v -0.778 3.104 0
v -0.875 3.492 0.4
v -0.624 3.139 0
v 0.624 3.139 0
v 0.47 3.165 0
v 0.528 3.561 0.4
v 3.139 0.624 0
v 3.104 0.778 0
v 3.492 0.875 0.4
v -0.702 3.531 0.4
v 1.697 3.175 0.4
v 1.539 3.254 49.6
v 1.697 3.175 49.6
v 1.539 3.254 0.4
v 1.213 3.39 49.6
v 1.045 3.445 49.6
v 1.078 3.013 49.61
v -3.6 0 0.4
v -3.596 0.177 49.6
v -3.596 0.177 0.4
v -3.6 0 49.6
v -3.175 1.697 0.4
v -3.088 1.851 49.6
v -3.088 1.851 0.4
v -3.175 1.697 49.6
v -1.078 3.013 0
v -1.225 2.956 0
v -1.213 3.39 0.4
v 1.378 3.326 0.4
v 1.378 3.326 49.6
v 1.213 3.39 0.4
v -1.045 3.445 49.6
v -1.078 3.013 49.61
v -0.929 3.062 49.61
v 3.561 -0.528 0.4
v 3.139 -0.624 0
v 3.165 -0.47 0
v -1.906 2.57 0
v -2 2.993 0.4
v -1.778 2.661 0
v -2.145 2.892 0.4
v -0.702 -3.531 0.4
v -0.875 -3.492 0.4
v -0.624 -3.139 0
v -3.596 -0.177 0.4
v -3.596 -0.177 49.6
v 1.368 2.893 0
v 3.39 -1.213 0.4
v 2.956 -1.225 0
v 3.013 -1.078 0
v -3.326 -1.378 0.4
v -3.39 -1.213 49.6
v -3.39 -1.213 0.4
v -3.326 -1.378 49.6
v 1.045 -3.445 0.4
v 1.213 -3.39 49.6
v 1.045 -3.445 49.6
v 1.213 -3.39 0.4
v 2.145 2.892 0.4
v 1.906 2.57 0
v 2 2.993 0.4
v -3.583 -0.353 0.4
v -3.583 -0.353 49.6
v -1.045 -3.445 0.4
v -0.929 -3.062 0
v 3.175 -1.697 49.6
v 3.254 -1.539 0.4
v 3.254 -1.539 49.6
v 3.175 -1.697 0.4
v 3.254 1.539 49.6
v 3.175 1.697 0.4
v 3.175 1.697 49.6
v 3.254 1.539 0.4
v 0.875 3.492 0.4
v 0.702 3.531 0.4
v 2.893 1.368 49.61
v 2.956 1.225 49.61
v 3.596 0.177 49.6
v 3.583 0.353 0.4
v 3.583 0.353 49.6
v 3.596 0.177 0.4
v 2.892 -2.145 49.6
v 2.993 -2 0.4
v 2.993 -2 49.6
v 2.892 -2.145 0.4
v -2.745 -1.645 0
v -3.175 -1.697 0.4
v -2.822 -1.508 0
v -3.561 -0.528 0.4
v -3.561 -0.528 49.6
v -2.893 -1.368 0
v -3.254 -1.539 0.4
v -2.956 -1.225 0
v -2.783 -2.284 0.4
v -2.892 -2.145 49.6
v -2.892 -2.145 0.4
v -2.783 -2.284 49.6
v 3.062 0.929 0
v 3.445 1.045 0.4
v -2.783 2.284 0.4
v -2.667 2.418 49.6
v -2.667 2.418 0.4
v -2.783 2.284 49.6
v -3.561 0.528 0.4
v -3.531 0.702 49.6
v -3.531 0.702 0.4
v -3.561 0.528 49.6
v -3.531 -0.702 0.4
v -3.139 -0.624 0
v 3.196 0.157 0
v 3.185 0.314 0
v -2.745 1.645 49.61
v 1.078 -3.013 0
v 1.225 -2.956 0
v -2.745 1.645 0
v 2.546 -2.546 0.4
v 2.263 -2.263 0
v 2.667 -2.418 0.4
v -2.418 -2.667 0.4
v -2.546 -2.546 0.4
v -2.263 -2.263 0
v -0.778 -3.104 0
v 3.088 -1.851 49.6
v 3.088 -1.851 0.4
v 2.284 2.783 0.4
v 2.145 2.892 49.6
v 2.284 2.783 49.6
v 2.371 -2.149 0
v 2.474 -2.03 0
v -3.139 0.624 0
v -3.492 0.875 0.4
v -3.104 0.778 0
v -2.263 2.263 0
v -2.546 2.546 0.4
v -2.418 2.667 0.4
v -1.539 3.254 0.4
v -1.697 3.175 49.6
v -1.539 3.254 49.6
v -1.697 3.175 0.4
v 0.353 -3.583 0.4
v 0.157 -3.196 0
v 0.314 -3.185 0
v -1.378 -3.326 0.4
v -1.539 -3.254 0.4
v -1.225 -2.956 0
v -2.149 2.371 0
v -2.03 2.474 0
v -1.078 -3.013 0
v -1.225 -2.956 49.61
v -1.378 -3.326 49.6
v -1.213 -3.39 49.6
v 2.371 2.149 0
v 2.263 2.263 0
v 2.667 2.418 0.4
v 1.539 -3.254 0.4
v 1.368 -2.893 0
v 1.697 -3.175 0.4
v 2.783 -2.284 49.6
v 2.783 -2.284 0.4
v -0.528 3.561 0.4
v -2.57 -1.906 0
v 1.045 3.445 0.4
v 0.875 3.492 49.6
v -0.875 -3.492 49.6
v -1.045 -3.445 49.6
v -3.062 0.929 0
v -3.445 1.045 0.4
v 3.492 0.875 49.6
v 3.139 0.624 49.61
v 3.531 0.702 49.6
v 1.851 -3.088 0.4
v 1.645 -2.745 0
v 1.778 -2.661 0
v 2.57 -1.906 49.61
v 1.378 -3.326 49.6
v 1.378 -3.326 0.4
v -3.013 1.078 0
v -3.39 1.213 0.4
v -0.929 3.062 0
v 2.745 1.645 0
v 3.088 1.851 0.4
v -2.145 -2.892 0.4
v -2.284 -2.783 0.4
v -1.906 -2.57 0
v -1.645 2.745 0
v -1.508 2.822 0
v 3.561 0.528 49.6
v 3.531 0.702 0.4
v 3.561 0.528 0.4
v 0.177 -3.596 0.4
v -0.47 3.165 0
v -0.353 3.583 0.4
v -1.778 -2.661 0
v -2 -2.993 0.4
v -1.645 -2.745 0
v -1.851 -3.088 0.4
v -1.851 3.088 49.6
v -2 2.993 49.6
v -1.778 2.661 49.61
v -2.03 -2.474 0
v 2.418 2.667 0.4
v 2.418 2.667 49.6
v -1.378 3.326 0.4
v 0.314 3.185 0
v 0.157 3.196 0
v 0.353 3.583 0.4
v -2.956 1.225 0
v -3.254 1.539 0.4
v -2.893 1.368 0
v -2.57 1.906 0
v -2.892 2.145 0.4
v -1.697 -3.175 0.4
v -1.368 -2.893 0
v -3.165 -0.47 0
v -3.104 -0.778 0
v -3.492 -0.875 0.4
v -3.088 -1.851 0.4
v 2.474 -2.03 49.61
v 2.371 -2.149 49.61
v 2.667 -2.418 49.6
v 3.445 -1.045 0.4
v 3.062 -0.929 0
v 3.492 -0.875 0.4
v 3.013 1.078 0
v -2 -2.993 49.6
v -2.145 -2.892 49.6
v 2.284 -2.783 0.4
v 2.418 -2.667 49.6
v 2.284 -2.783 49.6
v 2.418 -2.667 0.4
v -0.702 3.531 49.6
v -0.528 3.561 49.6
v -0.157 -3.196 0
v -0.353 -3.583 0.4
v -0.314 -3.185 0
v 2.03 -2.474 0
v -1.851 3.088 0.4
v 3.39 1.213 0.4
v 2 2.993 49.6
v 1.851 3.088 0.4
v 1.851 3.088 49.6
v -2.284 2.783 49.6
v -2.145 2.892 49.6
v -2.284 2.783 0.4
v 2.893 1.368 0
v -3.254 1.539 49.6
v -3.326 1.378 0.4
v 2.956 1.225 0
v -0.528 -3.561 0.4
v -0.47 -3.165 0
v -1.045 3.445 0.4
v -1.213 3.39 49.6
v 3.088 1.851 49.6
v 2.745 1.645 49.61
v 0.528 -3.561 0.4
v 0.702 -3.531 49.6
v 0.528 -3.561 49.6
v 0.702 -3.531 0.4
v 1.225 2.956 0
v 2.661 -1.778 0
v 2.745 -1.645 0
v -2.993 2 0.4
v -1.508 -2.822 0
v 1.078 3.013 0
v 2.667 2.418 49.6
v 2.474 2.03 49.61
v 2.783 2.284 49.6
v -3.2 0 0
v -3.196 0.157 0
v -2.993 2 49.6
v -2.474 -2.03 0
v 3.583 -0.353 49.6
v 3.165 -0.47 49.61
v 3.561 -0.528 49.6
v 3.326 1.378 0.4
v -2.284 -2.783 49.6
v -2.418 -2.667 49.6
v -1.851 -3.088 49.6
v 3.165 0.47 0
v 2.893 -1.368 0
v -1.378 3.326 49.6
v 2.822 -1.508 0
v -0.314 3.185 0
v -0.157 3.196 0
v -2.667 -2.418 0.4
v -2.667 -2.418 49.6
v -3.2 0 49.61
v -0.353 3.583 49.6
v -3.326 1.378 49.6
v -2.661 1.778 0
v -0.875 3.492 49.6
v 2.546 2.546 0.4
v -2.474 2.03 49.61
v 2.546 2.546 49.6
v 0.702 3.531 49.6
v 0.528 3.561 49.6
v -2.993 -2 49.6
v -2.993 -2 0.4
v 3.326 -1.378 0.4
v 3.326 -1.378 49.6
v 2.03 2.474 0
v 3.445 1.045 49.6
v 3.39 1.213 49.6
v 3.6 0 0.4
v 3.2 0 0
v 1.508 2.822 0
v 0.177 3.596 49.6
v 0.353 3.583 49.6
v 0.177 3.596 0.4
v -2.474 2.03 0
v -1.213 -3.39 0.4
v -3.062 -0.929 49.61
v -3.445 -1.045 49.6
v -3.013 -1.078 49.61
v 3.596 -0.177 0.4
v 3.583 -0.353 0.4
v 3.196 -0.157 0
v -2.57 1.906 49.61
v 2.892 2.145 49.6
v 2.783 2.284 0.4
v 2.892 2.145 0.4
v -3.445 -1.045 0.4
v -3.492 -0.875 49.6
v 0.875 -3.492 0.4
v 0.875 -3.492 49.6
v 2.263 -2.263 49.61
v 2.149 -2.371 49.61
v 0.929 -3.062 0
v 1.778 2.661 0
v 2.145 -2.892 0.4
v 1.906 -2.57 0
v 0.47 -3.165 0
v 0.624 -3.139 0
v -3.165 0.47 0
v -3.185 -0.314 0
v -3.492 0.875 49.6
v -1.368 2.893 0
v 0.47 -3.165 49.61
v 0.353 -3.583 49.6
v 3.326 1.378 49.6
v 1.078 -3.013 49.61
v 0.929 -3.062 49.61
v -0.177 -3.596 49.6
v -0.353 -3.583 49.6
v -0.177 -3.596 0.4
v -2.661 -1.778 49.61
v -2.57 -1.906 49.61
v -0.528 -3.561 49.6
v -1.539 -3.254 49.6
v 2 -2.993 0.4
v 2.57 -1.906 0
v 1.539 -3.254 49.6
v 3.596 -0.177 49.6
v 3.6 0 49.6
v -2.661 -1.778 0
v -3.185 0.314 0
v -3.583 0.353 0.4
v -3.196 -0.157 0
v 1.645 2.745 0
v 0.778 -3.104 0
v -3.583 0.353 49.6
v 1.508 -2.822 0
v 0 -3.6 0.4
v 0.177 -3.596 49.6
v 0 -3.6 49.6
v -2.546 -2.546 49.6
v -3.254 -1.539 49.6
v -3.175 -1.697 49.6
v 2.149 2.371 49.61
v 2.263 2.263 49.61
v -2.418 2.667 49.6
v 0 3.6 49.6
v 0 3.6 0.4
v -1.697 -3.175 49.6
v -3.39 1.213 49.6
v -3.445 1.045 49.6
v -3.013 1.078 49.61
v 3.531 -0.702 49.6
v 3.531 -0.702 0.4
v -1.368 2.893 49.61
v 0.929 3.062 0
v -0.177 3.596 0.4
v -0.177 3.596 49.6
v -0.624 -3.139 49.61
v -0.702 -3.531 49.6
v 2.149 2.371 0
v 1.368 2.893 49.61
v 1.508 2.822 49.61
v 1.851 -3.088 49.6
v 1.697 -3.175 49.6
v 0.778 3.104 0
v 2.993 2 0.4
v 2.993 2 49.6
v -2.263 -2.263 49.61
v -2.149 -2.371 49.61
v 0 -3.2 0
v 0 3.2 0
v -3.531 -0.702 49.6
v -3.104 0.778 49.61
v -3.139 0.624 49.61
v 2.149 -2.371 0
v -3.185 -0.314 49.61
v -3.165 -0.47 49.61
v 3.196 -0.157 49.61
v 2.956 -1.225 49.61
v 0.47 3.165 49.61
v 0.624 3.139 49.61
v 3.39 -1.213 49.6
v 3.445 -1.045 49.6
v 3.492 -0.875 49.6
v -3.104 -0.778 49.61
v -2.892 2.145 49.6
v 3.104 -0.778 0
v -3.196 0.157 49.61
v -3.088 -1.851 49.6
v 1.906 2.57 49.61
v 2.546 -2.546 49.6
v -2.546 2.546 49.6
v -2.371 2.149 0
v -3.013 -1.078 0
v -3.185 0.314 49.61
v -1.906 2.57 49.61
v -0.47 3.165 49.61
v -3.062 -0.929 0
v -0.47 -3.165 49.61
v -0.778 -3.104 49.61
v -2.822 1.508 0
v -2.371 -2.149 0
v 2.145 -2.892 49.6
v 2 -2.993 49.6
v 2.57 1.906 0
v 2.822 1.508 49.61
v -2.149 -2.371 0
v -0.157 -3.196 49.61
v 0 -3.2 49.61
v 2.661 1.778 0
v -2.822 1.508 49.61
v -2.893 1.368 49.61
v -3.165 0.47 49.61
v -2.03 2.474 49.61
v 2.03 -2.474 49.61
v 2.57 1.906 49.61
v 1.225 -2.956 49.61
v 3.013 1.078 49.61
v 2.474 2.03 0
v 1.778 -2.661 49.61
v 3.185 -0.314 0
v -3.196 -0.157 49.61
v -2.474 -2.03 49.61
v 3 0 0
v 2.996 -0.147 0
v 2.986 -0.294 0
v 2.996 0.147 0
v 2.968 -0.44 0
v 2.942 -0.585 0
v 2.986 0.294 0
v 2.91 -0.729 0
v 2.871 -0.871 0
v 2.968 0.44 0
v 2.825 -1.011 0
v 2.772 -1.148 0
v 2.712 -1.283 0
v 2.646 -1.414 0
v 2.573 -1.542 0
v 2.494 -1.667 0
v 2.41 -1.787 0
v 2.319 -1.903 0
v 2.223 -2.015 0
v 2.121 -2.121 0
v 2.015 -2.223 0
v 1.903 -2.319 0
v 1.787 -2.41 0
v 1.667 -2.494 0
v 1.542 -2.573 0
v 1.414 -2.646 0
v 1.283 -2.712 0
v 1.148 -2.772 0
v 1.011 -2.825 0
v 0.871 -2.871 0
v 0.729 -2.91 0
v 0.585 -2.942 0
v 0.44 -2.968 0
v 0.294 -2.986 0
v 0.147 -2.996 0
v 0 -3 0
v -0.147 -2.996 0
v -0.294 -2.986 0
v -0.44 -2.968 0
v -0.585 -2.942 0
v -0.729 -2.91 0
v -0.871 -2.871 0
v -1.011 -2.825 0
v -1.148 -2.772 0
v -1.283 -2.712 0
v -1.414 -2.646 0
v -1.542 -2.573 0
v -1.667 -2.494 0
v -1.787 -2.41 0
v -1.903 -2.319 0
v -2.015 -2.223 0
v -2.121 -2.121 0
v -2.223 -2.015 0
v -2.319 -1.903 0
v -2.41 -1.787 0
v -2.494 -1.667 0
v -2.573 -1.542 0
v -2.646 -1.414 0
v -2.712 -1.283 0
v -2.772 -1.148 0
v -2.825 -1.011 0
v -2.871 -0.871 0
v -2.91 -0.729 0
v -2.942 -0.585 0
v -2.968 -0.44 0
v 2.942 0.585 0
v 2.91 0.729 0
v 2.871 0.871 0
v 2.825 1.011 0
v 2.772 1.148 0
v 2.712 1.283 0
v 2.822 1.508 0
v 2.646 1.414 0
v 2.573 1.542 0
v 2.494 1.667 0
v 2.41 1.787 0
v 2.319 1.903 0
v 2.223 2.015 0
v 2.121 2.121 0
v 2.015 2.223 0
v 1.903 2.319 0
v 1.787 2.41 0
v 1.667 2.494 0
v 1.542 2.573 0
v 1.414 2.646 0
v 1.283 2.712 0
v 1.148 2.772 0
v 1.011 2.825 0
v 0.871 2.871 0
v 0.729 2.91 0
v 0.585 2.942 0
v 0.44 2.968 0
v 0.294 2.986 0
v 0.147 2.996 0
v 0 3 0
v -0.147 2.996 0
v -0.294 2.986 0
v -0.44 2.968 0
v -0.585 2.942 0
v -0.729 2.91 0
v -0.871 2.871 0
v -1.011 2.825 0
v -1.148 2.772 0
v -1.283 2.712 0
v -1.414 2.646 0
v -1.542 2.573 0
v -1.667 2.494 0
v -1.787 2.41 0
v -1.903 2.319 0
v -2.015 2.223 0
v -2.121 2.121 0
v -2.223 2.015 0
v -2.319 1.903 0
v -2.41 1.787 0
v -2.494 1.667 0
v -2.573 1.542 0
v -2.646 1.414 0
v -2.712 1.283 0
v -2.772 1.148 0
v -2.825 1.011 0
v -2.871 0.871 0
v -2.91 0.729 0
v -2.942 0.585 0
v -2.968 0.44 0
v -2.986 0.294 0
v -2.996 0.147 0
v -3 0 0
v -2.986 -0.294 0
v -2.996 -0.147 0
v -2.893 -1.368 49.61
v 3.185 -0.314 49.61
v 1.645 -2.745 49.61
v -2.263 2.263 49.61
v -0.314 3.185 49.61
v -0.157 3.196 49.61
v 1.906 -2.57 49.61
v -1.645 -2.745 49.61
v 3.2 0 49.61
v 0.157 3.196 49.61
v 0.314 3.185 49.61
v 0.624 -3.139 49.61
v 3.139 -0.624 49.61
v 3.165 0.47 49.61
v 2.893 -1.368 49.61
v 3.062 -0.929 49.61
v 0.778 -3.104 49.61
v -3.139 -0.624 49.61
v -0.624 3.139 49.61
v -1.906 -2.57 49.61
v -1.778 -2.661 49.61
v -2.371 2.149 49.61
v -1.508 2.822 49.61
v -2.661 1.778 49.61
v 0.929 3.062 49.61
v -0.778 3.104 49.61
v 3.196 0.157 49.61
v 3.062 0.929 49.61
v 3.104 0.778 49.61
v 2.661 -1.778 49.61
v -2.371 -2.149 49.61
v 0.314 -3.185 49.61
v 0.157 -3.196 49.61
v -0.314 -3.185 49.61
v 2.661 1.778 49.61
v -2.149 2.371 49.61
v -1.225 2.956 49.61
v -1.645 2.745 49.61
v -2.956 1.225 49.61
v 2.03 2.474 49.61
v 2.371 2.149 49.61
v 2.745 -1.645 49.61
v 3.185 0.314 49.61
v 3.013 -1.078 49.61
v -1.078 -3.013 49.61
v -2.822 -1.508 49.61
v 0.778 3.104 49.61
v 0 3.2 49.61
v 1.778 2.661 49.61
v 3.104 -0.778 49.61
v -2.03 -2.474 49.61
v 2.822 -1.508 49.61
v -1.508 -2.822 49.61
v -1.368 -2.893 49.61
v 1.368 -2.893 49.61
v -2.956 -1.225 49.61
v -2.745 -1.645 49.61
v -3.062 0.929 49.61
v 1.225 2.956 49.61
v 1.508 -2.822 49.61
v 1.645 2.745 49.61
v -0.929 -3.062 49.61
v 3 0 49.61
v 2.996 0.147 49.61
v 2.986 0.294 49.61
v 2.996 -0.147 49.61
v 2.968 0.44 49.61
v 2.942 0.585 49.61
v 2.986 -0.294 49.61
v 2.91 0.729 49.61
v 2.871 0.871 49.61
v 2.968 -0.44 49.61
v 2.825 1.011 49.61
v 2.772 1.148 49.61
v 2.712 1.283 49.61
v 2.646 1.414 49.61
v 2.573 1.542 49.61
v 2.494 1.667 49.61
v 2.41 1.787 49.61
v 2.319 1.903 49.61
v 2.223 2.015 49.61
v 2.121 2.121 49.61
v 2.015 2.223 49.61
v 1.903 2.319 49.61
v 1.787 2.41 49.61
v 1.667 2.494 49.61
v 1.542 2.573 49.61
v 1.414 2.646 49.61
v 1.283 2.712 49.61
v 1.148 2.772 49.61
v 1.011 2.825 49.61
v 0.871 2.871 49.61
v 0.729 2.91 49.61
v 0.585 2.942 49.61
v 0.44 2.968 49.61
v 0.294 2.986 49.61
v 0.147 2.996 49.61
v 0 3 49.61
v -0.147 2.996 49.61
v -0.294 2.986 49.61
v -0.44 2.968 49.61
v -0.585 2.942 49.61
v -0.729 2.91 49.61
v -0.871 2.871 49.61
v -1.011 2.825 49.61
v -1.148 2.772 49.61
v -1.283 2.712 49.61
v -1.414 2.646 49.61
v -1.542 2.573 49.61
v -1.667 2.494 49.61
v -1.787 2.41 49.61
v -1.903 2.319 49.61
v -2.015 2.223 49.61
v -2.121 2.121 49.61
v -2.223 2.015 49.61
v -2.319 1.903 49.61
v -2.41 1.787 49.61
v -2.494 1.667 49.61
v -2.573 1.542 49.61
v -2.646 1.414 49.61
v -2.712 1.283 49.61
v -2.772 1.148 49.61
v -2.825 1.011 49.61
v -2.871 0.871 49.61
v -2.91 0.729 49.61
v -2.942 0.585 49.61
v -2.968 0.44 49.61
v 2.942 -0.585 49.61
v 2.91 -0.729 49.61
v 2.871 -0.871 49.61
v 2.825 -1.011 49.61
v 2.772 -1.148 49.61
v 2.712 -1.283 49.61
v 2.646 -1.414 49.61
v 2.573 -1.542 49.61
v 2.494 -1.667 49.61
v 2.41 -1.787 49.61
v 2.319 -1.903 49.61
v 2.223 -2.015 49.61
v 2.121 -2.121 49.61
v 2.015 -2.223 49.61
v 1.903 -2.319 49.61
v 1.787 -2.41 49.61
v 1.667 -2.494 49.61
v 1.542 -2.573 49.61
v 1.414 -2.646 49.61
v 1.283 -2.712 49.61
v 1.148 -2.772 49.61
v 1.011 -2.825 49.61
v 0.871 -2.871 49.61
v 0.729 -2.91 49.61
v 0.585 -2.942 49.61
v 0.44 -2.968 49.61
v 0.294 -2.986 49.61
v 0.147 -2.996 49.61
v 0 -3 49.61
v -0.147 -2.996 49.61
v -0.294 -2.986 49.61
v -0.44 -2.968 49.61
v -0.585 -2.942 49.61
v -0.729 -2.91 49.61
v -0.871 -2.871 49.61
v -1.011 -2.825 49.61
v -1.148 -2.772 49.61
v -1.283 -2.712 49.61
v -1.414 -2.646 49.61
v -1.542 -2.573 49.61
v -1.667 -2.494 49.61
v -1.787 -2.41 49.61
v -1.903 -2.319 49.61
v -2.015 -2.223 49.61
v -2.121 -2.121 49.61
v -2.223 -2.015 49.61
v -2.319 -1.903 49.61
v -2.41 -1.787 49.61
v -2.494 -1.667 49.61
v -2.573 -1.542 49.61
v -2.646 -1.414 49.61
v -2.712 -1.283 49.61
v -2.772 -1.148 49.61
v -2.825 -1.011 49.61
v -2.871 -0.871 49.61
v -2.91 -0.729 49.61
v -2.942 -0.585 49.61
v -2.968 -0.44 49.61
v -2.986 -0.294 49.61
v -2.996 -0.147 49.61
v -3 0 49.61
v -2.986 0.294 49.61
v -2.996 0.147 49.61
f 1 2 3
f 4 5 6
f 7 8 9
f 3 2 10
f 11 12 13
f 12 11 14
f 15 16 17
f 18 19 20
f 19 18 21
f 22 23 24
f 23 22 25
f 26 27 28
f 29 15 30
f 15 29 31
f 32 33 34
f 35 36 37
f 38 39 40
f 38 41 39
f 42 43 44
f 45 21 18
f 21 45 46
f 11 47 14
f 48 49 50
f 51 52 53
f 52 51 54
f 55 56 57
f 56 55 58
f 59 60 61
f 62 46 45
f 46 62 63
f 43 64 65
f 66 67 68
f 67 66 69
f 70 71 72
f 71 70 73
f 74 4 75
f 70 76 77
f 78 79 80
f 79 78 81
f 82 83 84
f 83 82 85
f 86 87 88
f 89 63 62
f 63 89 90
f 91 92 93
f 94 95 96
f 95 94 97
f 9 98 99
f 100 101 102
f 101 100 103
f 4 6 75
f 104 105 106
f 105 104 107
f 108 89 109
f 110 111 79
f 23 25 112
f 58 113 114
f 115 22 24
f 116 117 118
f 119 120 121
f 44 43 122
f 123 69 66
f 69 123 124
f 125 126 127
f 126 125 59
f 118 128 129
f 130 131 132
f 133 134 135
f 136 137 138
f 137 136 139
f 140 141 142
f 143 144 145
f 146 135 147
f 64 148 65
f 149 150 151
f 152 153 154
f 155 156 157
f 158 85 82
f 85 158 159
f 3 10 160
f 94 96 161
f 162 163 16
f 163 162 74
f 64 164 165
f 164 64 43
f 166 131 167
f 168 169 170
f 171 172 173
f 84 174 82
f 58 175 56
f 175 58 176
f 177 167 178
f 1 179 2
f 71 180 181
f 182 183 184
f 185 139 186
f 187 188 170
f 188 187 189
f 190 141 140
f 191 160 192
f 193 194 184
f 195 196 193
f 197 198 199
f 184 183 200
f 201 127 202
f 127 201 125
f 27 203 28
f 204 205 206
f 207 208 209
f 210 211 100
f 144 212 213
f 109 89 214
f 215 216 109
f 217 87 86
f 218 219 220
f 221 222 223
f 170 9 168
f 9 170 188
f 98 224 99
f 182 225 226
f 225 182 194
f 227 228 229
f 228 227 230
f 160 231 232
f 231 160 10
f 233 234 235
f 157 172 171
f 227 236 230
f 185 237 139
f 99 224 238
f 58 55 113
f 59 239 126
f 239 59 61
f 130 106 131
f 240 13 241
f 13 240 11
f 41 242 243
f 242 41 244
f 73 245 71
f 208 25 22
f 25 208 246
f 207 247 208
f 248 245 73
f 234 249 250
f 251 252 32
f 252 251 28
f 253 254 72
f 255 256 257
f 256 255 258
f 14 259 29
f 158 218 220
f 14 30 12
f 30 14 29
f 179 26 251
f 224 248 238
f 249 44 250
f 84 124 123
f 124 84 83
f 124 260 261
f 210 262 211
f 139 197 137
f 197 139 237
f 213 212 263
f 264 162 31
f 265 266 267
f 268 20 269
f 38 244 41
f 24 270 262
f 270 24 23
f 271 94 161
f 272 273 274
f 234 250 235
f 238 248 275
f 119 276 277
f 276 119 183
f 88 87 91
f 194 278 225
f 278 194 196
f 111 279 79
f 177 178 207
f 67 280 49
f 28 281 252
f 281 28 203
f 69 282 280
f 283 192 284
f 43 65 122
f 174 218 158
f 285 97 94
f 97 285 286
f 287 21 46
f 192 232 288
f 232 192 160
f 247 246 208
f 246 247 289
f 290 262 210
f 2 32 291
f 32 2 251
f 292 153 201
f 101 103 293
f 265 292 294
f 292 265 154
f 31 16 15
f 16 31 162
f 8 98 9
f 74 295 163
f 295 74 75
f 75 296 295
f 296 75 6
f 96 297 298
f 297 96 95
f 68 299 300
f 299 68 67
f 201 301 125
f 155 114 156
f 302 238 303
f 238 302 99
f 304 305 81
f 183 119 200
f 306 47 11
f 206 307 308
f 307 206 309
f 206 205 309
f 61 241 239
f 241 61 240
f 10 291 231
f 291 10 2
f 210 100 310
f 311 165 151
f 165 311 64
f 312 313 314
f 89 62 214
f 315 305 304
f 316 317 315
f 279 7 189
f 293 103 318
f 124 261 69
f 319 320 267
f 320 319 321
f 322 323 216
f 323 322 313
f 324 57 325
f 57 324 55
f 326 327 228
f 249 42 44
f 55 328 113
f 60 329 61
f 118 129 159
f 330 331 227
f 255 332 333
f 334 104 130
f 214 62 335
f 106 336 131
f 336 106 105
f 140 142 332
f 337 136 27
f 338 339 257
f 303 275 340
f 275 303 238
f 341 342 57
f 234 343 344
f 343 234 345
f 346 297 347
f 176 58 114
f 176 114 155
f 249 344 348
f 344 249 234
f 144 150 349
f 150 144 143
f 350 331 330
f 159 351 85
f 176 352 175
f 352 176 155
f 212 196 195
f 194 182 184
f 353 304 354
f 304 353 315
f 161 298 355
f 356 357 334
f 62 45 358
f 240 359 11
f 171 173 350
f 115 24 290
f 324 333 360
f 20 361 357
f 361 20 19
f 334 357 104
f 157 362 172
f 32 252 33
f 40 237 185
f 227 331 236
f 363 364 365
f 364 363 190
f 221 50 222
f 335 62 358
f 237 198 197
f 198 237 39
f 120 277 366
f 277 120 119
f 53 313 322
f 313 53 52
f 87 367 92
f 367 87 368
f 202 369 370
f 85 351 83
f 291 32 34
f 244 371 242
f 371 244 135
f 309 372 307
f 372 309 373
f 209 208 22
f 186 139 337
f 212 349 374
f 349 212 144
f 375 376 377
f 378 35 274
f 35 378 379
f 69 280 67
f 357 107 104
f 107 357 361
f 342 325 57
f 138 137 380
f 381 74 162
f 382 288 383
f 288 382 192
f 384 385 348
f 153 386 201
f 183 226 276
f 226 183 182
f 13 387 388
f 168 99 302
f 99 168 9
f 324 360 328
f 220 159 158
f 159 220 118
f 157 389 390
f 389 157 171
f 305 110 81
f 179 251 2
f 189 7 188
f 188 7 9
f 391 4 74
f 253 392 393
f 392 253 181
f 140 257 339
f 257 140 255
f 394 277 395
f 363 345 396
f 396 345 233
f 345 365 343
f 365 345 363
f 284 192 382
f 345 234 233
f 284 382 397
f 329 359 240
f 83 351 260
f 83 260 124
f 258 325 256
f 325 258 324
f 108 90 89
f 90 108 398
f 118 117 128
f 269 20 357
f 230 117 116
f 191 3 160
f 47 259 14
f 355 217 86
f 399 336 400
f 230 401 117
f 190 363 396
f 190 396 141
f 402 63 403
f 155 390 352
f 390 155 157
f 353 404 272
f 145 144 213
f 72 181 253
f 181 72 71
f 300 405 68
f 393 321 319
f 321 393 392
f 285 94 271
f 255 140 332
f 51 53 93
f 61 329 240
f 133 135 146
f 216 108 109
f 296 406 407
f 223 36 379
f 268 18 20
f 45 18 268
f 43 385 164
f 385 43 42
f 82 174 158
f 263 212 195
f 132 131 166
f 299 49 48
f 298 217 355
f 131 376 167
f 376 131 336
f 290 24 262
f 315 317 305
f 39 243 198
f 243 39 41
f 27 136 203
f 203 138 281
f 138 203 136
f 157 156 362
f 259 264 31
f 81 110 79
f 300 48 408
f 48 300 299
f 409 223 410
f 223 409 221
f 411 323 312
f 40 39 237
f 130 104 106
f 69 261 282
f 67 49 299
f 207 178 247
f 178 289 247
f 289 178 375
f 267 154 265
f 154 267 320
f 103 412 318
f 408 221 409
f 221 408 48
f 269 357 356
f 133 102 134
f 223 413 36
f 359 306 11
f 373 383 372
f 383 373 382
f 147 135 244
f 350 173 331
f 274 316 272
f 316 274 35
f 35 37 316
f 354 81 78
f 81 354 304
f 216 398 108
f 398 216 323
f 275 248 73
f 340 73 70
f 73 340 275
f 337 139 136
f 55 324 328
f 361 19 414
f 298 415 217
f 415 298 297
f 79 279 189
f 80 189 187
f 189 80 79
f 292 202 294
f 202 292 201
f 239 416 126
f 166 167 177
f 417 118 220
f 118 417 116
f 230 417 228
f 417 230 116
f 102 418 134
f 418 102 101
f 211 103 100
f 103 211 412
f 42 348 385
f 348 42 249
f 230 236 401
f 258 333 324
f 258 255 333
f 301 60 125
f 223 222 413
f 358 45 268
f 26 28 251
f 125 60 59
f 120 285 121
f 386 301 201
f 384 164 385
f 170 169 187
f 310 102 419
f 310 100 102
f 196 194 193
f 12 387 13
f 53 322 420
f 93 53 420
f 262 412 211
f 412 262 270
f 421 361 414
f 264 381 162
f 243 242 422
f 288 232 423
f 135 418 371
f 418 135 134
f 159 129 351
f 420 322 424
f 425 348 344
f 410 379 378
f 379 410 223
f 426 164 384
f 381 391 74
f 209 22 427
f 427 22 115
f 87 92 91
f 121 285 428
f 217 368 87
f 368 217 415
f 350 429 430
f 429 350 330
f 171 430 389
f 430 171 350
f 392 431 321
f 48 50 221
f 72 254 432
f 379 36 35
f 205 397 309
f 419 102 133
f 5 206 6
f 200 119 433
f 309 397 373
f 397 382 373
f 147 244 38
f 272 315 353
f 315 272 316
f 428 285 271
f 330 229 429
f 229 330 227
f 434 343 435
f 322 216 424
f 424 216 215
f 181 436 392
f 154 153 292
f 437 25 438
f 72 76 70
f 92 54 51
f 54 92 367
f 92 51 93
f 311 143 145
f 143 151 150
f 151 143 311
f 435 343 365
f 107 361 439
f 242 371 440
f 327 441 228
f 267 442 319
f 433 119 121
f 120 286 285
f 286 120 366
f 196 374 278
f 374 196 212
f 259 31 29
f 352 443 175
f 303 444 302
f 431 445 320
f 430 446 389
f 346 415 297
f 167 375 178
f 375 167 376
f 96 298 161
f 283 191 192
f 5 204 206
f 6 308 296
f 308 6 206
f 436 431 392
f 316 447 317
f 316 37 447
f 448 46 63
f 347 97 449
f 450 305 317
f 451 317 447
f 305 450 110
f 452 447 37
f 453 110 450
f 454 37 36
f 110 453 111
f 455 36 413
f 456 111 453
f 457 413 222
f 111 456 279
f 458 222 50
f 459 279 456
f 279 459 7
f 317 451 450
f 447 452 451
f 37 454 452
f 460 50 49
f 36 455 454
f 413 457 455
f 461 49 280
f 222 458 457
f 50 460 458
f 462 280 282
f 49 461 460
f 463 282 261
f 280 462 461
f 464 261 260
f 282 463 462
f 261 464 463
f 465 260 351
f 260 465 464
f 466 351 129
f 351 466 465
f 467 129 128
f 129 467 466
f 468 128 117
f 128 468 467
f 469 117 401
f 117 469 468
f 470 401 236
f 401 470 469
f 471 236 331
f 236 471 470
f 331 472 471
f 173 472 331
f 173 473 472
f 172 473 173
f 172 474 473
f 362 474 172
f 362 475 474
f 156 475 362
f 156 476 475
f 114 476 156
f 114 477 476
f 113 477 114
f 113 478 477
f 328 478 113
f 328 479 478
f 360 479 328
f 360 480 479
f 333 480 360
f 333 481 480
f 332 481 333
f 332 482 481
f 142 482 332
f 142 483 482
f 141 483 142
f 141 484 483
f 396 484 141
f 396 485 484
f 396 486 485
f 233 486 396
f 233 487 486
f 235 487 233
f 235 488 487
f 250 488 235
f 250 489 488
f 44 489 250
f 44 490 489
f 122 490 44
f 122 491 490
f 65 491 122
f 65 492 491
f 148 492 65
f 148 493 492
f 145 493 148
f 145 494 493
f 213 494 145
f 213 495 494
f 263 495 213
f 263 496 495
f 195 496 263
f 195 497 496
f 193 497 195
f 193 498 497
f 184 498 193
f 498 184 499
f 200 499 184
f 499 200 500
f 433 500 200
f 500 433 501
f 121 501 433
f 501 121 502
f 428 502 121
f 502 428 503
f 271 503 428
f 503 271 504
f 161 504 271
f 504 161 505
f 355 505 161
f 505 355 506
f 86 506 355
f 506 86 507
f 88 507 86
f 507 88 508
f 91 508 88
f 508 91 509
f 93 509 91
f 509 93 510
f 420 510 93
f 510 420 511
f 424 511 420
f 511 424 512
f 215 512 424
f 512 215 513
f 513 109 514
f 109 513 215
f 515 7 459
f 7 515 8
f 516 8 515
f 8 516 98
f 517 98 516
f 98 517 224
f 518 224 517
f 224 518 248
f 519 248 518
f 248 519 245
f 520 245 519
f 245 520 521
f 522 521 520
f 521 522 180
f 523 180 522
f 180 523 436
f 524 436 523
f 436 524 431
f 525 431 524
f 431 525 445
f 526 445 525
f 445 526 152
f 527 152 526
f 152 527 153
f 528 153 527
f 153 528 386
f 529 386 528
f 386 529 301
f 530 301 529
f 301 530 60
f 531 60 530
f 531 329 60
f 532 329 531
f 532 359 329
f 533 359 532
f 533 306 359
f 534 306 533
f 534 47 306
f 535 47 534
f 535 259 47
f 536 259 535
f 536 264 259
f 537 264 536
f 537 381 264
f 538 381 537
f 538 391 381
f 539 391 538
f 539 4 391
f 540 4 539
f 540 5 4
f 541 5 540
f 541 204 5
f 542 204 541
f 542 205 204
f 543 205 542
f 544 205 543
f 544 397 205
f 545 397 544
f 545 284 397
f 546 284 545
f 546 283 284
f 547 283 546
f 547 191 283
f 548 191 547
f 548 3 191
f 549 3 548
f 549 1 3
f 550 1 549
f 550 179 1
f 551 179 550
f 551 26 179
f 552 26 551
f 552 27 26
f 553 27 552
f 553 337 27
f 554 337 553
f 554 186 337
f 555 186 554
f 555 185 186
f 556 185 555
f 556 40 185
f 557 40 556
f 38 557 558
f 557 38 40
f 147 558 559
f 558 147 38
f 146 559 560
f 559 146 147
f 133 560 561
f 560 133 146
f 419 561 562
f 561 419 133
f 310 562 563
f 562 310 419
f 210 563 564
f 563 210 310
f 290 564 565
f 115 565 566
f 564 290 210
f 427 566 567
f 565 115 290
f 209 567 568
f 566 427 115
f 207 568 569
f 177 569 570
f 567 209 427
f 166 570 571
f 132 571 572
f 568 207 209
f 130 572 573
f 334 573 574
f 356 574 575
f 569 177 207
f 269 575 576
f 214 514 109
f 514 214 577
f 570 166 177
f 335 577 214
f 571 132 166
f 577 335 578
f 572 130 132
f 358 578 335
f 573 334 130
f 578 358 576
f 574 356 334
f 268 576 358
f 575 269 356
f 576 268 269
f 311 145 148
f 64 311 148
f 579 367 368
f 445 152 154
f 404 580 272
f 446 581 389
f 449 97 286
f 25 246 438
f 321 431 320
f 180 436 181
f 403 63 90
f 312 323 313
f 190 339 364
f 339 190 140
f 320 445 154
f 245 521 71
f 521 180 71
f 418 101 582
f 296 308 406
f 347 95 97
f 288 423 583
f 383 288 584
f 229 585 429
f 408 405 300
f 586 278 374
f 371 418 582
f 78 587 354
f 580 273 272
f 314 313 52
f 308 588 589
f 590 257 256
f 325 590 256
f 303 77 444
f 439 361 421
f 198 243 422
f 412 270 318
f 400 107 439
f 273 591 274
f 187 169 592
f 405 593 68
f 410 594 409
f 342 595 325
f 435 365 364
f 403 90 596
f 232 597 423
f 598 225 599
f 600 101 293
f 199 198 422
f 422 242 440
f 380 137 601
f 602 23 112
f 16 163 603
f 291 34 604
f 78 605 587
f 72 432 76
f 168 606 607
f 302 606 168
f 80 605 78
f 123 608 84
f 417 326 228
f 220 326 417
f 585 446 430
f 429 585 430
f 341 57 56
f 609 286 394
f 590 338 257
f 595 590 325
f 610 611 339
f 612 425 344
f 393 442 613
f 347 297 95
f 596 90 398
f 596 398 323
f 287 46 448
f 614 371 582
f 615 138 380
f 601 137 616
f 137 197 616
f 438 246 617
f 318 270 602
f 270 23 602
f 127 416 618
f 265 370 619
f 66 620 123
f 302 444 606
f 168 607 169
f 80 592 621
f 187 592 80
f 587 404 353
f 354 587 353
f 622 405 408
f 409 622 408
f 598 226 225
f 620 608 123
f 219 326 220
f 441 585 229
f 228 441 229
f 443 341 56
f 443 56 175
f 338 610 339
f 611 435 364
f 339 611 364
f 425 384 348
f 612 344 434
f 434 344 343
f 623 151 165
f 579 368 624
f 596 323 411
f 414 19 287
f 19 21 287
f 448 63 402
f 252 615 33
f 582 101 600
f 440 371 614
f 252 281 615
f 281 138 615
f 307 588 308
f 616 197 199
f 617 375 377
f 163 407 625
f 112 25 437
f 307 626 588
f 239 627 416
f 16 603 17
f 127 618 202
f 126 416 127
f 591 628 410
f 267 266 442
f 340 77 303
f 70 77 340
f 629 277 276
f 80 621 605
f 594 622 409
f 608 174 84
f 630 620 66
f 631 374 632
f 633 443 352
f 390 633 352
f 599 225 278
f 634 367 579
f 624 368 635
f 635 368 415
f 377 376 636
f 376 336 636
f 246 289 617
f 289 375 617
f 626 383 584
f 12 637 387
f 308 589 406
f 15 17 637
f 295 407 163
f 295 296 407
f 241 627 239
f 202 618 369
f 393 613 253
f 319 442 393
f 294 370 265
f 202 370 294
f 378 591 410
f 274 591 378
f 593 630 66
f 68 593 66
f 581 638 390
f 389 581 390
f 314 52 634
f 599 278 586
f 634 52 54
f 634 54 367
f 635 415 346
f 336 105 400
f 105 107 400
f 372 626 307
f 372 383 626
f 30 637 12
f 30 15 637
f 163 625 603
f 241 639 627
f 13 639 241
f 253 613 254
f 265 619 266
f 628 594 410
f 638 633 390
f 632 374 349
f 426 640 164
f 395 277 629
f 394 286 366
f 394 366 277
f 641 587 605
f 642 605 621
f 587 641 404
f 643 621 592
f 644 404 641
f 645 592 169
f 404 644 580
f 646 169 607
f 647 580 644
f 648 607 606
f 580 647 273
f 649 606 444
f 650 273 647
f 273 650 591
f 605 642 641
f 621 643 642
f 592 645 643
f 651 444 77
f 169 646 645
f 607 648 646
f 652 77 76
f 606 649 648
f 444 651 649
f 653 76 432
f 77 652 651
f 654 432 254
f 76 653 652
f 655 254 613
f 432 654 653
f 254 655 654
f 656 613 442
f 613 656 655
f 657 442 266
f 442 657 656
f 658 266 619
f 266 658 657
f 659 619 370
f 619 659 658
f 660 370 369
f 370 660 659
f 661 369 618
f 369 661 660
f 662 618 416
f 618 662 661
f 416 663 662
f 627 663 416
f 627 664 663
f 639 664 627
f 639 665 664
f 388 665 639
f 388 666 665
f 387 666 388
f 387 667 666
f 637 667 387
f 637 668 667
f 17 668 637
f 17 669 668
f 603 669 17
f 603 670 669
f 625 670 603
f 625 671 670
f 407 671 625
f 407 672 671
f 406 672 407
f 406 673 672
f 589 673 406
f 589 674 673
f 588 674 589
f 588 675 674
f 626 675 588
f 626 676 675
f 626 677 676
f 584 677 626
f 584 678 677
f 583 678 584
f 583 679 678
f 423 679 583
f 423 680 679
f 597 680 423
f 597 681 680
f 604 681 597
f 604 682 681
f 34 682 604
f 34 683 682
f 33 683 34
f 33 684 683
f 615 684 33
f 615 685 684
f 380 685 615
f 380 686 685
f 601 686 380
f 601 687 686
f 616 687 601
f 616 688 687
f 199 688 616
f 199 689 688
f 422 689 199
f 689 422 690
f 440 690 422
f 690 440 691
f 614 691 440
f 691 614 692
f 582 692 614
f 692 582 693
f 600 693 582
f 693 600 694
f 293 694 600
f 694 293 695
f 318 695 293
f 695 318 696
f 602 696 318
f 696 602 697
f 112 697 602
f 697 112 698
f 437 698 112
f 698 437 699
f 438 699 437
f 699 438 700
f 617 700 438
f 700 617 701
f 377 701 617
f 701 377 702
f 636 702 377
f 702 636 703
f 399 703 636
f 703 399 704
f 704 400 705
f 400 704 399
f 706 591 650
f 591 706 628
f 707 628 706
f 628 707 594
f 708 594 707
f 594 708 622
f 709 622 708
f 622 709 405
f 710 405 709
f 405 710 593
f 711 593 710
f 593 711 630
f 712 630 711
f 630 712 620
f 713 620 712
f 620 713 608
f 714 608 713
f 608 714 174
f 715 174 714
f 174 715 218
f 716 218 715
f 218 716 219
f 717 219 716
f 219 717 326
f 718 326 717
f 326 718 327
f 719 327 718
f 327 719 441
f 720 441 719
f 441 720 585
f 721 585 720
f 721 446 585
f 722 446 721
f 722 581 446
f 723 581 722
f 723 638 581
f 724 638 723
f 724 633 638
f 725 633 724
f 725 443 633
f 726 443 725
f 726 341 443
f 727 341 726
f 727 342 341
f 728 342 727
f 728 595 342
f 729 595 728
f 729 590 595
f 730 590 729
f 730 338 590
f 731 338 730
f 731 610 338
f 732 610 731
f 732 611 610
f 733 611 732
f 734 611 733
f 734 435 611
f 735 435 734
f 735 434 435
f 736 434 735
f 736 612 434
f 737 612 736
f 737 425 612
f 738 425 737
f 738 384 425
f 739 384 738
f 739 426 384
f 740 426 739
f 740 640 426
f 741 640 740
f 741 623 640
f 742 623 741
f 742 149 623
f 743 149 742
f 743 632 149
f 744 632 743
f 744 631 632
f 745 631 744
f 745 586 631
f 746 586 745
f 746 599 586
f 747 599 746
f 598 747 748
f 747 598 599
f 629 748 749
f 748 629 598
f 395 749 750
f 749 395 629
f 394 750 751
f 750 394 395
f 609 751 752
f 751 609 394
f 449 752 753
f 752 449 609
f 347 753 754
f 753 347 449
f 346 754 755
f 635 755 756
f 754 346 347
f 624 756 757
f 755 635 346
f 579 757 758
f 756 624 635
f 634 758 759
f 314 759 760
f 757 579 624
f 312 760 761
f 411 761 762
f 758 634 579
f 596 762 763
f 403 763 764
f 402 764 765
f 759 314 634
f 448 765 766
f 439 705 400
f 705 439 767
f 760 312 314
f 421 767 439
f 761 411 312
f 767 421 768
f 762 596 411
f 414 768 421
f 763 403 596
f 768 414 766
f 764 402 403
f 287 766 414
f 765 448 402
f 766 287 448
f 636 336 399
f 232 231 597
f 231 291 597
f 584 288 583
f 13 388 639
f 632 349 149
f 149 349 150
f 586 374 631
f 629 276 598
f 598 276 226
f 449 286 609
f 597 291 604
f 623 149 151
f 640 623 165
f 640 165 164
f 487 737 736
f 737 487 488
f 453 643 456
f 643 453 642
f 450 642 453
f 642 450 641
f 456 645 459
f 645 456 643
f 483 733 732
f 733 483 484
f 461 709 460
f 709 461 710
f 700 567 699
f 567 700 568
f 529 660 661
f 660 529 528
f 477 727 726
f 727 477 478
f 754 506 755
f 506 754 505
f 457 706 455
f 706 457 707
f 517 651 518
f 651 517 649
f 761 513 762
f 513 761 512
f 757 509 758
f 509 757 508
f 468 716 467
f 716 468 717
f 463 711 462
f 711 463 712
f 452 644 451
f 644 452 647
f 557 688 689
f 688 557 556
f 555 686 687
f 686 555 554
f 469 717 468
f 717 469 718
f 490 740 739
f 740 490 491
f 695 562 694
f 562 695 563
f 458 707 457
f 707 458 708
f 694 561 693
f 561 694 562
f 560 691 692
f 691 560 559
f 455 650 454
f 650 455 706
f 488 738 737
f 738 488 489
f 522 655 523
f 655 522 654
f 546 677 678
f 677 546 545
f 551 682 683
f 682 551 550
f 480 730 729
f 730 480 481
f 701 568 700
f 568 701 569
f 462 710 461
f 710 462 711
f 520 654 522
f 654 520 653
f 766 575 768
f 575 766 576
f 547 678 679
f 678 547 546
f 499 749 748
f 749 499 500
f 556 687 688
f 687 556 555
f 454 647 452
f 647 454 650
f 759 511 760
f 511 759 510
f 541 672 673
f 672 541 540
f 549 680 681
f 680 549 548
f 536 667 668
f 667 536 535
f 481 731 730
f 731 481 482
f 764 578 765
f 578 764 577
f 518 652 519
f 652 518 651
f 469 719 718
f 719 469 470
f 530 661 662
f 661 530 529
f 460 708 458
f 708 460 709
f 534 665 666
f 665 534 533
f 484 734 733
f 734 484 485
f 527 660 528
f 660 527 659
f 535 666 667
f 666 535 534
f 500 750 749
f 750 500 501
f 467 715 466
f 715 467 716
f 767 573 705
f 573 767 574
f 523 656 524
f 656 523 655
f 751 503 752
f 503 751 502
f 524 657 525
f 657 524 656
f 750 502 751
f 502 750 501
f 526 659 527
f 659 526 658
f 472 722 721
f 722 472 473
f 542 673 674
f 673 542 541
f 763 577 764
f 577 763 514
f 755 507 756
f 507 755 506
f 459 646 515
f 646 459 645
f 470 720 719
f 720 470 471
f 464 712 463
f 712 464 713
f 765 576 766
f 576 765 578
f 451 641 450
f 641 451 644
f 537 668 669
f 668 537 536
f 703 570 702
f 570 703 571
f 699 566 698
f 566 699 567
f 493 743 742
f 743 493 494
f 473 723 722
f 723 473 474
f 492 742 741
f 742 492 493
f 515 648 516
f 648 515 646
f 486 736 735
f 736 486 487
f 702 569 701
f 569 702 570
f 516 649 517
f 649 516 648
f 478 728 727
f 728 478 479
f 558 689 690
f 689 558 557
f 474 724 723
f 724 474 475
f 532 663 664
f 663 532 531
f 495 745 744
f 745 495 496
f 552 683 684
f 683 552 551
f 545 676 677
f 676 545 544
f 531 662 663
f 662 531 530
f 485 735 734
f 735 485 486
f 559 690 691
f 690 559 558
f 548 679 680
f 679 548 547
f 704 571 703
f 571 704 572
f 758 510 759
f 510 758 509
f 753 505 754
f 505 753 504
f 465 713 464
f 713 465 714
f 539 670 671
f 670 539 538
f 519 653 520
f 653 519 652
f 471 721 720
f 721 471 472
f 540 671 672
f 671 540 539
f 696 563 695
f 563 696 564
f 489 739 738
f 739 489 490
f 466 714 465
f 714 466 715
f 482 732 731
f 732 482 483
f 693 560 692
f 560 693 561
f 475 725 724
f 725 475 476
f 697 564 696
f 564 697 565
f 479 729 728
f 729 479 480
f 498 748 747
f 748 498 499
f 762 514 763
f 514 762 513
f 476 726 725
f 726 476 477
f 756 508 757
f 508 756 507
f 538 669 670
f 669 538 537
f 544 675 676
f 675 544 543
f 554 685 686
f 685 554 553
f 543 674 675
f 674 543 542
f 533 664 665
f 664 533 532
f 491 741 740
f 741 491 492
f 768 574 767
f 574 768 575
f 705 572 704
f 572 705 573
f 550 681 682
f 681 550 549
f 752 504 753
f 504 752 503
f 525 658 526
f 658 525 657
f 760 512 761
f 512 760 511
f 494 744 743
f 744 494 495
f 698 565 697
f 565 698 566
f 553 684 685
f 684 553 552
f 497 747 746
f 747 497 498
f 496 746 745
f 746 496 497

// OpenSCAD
$fn = 128;

// Heatshrink sleeving (tubing) parameters
inner_d = 6;          // inner diameter (mm)
wall = 0.6;           // wall thickness (mm)
length = 50;          // length (mm)

// Optional subtle end chamfer (set to 0 for square ends)
chamfer = 0.4;        // mm

outer_d = inner_d + 2*wall;

module heatshrink_sleeve(id=inner_d, od=outer_d, L=length, c=chamfer) {
    difference() {
        // Outer body with optional chamfer
        if (c > 0) {
            hull() {
                translate([0,0,0]) cylinder(d=od - 2*c, h=0.01);
                translate([0,0,c]) cylinder(d=od, h=L - 2*c);
                translate([0,0,L - c]) cylinder(d=od - 2*c, h=0.01);
            }
        } else {
            cylinder(d=od, h=L);
        }

        // Inner bore (slightly extended to ensure clean subtraction)
        translate([0,0,-0.5]) cylinder(d=id, h=L + 1);
    }
}

heatshrink_sleeve();
